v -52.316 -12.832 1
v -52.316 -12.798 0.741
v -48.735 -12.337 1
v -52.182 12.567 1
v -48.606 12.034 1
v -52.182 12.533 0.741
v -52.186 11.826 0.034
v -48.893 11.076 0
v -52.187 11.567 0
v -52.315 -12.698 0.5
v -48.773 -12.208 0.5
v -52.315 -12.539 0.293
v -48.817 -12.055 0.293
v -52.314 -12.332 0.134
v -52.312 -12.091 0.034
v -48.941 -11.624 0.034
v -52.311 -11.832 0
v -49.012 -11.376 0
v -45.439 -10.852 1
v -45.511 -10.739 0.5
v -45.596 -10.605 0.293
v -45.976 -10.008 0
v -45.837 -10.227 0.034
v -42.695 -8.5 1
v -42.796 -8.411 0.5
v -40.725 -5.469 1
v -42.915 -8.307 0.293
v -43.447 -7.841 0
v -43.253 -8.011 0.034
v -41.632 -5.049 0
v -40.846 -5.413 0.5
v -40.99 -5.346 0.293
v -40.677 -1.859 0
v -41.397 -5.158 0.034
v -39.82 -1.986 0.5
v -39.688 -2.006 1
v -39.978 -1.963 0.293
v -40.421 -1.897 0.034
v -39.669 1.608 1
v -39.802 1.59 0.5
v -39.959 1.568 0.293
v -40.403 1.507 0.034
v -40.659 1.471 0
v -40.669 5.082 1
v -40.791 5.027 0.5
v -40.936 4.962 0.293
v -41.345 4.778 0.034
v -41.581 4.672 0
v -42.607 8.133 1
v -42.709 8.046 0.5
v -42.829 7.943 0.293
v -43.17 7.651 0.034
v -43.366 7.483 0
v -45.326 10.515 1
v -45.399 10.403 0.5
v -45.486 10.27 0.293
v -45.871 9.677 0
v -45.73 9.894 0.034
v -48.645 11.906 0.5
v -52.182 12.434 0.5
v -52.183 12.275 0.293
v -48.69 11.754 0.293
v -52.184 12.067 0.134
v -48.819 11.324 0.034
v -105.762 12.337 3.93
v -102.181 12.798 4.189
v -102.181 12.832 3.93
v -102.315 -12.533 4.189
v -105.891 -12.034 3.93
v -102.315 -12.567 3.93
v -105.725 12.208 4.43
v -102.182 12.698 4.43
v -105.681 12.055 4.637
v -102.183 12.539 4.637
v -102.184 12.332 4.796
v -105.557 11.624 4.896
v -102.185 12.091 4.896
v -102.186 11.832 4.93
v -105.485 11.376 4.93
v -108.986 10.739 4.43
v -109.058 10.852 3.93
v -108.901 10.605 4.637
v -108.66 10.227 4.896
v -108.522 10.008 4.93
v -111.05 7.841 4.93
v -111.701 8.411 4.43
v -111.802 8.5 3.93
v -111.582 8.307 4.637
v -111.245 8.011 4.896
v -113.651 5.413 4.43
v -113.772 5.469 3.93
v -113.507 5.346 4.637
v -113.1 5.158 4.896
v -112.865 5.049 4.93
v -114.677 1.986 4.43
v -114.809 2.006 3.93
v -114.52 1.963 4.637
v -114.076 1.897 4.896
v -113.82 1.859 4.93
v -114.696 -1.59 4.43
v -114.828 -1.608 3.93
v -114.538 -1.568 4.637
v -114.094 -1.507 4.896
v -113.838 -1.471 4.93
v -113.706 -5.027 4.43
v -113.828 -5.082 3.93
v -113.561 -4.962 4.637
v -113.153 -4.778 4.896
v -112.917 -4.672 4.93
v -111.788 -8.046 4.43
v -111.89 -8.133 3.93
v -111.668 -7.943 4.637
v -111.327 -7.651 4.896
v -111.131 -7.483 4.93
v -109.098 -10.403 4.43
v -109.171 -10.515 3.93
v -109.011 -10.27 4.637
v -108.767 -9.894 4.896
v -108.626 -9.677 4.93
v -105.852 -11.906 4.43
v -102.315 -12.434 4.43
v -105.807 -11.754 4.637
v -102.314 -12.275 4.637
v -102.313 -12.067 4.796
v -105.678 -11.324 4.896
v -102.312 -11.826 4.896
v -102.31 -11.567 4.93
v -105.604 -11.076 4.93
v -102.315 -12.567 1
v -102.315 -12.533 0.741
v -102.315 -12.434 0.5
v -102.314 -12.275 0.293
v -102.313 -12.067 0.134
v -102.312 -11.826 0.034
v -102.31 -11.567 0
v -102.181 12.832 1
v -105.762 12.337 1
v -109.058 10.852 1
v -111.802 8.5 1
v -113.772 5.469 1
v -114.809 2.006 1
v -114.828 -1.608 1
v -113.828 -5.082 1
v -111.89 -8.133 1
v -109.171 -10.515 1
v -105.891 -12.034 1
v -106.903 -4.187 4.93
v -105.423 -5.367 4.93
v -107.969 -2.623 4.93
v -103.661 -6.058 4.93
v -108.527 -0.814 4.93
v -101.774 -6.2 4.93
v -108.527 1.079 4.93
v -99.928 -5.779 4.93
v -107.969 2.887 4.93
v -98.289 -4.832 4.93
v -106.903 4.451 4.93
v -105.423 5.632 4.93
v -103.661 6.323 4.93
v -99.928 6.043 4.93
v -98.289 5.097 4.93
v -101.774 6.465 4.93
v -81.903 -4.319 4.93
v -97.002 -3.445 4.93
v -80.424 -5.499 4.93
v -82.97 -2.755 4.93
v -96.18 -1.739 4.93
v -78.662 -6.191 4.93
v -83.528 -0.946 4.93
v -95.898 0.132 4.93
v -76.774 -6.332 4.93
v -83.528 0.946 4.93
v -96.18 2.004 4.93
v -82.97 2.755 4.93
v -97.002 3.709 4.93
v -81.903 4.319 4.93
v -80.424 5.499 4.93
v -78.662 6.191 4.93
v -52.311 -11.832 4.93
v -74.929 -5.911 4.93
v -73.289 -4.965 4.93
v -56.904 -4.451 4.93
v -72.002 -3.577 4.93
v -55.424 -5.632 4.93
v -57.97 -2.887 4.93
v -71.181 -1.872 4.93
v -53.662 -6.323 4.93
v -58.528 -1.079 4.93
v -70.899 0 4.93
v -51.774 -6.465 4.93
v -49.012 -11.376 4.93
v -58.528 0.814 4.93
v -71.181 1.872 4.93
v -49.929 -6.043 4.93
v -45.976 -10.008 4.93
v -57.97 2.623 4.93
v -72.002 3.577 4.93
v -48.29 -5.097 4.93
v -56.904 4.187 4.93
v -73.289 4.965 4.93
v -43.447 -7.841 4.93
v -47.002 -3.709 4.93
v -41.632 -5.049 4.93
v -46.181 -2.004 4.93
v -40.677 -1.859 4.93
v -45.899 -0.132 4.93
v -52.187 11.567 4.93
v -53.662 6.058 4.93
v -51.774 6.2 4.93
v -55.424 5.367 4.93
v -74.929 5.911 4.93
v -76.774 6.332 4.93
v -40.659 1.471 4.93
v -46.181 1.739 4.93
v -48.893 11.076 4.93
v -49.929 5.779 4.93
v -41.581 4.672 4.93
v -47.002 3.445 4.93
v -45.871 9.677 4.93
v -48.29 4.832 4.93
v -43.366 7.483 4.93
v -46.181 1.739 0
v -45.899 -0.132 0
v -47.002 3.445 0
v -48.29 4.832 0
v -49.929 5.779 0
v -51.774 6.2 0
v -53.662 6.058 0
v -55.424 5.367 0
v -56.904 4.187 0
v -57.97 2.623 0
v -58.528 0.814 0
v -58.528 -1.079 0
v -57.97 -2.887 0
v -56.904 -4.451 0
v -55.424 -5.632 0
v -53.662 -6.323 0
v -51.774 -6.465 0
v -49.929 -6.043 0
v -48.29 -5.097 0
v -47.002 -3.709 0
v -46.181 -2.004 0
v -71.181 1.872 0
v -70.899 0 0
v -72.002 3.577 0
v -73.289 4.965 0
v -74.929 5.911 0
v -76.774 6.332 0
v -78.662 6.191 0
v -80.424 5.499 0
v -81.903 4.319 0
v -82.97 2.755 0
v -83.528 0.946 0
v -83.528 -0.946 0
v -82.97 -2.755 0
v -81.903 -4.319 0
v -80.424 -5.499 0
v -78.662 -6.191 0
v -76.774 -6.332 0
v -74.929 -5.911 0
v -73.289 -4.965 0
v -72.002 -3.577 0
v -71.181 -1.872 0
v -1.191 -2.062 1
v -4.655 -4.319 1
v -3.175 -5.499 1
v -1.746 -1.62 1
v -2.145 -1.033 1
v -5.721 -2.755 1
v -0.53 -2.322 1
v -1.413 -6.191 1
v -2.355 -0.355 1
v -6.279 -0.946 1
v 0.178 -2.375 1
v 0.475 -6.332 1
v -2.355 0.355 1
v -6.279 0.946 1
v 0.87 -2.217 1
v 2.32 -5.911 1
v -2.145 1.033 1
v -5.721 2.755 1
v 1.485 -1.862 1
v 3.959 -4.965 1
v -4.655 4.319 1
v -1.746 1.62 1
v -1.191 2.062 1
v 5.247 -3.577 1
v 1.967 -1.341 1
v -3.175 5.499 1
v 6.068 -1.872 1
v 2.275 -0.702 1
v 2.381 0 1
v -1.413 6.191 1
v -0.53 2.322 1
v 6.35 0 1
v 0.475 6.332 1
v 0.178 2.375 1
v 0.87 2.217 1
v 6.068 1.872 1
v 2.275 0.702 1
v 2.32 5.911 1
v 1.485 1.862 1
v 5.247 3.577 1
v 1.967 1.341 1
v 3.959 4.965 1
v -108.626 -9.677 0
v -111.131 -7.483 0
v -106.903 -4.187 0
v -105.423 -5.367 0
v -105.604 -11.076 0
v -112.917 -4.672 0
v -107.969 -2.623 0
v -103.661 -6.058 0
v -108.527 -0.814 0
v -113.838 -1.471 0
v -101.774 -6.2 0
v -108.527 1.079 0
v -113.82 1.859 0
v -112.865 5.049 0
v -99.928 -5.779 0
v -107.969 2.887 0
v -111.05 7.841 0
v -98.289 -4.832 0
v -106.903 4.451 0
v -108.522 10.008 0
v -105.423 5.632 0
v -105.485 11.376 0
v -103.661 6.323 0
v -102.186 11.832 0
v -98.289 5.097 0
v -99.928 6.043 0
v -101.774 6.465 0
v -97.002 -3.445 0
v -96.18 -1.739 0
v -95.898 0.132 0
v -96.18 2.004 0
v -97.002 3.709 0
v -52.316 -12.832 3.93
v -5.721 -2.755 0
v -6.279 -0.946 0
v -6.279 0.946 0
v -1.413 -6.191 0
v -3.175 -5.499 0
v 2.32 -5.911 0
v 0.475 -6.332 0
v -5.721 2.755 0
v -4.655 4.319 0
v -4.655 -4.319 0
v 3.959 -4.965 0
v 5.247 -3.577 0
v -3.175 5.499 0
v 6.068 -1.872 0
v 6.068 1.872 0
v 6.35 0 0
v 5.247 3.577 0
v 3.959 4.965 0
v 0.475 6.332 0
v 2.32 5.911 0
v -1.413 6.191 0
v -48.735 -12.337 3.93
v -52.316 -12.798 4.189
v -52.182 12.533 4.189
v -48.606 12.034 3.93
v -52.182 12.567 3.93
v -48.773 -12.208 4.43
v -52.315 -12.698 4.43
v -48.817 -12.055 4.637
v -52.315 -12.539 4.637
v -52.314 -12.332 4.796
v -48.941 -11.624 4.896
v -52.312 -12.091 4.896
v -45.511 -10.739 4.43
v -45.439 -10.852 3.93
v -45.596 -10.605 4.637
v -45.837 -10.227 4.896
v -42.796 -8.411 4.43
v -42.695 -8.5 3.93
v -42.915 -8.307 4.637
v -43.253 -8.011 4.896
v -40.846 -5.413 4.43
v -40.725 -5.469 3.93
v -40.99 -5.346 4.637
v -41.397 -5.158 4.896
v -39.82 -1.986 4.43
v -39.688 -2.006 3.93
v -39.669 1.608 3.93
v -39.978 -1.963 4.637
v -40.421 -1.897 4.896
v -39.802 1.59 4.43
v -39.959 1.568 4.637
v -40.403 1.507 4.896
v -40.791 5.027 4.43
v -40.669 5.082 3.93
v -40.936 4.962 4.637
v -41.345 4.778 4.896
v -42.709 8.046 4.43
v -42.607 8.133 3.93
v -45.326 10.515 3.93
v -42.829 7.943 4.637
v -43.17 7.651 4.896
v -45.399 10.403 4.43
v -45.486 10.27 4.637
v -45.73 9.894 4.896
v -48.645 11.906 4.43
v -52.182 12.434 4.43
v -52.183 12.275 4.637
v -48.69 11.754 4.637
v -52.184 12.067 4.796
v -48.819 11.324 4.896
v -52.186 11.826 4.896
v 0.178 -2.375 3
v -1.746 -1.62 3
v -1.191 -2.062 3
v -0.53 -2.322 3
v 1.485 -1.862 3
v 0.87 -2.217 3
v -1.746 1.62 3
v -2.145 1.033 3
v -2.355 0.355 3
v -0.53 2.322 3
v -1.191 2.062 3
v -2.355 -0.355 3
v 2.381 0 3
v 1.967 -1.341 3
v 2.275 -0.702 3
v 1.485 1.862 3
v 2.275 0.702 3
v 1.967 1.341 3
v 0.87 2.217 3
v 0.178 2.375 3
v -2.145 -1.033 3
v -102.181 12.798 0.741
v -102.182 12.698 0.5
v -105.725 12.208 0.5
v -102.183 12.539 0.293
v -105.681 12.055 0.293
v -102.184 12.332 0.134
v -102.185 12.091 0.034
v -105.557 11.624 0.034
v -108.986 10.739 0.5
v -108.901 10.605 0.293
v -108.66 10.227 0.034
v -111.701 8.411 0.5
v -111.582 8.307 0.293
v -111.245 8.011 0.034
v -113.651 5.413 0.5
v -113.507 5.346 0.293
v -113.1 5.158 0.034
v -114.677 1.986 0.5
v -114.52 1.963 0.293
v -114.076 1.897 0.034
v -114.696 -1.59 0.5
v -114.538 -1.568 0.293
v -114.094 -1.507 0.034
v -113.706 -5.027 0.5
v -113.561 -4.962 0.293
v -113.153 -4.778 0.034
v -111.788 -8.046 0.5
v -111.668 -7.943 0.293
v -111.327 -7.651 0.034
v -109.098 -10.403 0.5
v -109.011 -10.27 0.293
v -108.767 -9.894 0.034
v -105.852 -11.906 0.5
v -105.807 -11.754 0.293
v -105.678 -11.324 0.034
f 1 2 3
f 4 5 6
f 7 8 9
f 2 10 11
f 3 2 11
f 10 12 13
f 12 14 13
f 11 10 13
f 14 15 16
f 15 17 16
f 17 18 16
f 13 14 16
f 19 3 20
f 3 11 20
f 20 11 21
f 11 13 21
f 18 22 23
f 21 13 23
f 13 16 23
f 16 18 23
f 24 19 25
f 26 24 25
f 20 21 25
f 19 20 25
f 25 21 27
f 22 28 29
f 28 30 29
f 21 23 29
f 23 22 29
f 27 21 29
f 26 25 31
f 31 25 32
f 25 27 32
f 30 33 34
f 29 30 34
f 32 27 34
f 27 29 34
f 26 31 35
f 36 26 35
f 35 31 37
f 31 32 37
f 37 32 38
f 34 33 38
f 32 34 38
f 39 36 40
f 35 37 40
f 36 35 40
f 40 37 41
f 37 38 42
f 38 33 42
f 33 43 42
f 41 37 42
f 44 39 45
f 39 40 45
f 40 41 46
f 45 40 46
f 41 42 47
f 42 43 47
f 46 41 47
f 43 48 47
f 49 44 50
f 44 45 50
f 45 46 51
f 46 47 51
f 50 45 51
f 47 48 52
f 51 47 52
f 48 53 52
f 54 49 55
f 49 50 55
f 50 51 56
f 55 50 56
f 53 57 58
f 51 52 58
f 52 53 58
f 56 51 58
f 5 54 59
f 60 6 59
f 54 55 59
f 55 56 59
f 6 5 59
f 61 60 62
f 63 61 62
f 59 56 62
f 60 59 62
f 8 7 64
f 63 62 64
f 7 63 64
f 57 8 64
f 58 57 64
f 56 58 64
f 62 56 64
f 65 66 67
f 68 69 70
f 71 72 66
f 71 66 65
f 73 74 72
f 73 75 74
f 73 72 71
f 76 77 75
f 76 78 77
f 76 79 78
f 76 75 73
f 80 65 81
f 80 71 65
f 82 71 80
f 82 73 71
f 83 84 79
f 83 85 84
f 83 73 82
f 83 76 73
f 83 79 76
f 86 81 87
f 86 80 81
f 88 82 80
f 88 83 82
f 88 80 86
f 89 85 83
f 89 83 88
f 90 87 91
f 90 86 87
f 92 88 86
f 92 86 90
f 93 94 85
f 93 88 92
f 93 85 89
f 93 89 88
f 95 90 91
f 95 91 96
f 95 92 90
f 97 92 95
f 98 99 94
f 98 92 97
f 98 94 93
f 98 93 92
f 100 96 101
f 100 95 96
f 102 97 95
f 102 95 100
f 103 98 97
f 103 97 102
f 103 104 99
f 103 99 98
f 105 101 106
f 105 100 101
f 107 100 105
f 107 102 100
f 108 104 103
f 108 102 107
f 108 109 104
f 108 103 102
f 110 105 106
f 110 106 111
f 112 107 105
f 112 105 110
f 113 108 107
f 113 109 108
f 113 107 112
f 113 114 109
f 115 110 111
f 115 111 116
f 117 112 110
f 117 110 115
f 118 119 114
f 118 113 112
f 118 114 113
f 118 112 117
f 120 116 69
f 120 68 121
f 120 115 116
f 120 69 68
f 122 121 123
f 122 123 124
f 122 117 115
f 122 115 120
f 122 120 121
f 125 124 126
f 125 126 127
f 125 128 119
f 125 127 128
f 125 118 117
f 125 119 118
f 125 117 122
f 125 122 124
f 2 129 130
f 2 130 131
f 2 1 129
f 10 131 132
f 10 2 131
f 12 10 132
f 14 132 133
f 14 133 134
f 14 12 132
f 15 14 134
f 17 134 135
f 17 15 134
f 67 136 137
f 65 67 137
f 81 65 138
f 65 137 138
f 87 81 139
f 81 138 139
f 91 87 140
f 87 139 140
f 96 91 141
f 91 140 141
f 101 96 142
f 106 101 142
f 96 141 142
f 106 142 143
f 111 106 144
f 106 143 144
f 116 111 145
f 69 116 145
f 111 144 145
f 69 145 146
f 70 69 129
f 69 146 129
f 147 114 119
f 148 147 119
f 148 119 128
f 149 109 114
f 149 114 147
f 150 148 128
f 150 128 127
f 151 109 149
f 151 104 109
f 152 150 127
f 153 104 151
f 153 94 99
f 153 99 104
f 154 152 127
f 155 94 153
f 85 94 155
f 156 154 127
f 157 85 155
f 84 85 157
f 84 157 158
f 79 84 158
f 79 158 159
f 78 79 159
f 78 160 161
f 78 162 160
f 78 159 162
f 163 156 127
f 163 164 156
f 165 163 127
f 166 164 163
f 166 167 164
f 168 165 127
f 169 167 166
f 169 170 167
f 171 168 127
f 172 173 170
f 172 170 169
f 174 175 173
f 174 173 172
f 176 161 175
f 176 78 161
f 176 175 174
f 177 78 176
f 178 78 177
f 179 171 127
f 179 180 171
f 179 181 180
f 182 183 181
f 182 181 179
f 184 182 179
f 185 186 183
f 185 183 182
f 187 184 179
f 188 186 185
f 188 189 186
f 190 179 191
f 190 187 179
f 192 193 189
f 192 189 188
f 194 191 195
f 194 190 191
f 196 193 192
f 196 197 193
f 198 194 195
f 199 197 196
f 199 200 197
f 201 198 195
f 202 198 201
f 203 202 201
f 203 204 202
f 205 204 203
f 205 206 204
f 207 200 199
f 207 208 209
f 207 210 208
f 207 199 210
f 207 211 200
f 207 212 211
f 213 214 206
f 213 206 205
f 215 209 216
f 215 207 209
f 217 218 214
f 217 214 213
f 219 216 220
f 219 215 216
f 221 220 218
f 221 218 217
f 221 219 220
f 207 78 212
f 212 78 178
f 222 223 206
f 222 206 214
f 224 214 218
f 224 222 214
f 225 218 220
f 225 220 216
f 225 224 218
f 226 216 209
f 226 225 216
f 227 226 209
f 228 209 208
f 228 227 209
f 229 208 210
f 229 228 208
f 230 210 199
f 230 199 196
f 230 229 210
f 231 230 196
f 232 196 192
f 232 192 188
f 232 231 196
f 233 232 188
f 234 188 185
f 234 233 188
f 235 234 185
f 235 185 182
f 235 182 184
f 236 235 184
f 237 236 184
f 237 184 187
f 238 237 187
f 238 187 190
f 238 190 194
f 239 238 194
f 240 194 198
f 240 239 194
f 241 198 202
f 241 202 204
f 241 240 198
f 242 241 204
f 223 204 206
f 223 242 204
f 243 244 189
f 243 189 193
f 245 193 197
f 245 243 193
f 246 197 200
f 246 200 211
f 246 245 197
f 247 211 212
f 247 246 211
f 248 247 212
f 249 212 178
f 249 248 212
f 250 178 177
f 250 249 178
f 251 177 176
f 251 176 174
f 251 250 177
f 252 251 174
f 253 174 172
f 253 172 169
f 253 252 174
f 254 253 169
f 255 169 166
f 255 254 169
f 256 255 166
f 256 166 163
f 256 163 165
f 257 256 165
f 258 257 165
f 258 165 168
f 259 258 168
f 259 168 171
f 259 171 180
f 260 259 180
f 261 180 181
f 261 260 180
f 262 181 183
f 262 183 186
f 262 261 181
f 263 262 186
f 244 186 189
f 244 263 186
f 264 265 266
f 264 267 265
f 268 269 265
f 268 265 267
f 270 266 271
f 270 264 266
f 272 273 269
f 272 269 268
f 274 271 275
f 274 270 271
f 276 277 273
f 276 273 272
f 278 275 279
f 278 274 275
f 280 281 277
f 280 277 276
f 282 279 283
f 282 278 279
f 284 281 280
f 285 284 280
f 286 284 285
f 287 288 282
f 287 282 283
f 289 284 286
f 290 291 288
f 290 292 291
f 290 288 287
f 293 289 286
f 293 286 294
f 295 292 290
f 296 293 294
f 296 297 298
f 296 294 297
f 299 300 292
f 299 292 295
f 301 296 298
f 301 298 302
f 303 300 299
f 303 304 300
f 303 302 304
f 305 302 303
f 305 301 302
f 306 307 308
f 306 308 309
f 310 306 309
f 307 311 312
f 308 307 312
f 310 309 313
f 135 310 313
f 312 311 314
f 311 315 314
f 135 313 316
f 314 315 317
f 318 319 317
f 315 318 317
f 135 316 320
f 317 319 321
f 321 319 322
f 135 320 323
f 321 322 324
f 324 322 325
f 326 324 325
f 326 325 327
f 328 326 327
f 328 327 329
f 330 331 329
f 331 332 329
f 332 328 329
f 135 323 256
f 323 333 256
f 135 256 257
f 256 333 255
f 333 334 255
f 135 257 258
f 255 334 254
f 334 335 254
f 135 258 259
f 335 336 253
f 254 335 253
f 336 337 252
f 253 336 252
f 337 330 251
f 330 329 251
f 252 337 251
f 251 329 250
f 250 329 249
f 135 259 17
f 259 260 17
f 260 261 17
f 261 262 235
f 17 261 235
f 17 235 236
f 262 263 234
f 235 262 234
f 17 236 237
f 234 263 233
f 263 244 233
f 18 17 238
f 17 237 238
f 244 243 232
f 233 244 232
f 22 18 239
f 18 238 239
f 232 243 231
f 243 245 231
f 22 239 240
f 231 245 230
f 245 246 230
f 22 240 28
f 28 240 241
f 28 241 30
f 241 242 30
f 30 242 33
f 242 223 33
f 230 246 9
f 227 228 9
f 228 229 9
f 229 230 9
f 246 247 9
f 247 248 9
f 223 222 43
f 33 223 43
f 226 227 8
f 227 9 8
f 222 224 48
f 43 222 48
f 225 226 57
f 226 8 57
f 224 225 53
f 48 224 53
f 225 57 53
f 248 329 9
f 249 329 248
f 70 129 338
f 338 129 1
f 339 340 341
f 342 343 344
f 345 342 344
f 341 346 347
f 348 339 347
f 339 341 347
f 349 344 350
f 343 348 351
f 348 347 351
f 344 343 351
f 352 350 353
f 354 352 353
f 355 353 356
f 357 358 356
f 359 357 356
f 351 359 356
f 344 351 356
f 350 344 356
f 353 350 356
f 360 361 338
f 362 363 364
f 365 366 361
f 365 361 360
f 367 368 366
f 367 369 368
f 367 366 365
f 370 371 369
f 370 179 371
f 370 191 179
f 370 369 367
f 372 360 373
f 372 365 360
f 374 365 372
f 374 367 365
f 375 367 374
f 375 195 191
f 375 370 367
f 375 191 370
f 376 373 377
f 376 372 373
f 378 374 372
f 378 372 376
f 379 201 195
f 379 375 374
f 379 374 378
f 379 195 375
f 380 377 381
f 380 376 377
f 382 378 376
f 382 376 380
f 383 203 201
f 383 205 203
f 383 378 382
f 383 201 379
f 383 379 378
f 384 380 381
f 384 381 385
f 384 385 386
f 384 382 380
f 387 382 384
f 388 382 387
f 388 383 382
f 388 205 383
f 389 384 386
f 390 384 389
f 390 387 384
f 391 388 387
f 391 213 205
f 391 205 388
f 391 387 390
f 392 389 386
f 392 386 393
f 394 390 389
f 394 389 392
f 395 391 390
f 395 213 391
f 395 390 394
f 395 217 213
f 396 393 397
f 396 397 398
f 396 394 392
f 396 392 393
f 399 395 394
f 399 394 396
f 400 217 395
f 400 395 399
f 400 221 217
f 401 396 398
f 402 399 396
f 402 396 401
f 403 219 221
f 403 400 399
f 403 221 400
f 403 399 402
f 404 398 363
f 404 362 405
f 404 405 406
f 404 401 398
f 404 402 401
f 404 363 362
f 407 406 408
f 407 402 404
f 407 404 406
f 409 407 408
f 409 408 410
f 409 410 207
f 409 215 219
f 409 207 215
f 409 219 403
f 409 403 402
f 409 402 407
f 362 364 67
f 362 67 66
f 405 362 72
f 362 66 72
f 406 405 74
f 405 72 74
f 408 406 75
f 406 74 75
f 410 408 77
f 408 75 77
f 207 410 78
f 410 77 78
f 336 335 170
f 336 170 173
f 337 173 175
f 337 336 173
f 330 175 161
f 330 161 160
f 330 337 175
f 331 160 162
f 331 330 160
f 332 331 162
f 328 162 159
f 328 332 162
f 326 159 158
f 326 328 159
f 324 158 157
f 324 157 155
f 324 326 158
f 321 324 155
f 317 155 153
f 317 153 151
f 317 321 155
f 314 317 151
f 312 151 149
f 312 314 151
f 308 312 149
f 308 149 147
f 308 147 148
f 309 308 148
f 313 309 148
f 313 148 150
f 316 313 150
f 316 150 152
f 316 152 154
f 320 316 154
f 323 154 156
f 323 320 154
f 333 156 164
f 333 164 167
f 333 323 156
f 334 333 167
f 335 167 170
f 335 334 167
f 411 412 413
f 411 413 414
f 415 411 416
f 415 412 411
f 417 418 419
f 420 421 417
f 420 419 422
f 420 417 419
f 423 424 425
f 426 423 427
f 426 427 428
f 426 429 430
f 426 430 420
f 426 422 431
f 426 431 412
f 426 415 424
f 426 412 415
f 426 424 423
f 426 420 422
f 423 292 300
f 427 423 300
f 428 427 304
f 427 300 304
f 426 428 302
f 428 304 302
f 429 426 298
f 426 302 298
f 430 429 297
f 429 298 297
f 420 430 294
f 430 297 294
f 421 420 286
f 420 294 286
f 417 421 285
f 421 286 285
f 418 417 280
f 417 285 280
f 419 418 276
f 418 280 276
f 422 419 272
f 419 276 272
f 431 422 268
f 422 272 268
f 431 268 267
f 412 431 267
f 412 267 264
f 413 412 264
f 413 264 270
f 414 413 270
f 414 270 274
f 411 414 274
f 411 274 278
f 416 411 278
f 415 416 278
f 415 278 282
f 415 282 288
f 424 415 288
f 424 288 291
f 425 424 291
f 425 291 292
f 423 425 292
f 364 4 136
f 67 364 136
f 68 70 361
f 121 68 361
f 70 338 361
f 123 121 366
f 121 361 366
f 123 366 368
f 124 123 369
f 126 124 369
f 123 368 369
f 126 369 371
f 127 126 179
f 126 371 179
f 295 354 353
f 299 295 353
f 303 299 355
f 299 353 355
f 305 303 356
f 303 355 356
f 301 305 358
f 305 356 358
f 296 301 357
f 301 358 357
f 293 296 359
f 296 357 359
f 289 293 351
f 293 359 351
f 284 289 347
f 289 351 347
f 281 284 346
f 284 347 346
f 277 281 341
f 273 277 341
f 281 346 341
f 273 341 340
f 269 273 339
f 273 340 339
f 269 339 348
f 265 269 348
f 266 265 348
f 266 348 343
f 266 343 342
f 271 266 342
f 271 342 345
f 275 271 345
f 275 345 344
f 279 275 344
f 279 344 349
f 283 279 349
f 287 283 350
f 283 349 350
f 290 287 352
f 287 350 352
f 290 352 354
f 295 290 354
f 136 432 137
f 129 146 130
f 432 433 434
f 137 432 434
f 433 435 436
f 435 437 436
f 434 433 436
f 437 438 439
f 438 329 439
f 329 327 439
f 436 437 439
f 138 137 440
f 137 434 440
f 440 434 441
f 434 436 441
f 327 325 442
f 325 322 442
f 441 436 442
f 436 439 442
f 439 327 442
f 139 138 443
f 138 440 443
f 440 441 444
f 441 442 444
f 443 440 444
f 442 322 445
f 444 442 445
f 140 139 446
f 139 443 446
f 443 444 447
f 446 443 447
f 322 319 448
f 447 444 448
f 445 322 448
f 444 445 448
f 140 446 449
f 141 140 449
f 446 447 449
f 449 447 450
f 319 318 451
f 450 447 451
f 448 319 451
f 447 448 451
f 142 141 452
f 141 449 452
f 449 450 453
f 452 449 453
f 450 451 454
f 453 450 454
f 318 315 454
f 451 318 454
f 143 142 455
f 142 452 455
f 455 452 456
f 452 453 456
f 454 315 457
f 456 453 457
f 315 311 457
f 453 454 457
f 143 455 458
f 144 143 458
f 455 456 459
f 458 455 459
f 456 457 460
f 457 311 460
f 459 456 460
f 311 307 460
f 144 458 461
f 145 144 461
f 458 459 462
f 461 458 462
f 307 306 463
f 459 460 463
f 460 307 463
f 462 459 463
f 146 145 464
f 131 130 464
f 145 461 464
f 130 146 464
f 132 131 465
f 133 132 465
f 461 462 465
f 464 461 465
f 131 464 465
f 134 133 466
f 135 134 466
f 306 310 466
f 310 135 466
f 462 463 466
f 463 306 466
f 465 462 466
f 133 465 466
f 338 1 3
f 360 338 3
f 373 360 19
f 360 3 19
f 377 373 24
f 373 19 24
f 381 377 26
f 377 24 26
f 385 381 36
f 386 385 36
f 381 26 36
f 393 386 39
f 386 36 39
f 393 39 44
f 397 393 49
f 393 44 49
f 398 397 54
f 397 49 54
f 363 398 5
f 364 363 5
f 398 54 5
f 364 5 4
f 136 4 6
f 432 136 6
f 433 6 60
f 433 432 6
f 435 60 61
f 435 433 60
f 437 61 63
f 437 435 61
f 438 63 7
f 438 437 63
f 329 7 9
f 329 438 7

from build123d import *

# Parameters (mm, degrees)
F0_R     = 6.35
F1_DEPTH = 4.93
F2_R     = 1
F0_R_2   = 2.38125
F3_DEPTH = 1
F4_DEPTH = 3


with BuildPart() as f1:
    # F0 (on Top) → F1 (new body)
    with BuildSketch(Plane.XY):
        with BuildLine():
            Line((-52.181716, 12.567485), (-102.181015, 12.832159))
            ThreePointArc((-102.181015, 12.832159), (-114.948064, 0.199565), (-102.31547, -12.567485))
            Line((-102.31547, -12.567485), (-52.31617, -12.832159))
            ThreePointArc((-52.31617, -12.832159), (-39.549121, -0.199565), (-52.181716, 12.567485))
        make_face()
        with Locations((-77.248593, 0)):
            Circle(F0_R, mode=Mode.SUBTRACT)
        with Locations((-52.248943, -0.132337)):
            Circle(F0_R, mode=Mode.SUBTRACT)
        with Locations((-102.248242, 0.132337)):
            Circle(F0_R, mode=Mode.SUBTRACT)
    extrude(amount=F1_DEPTH)

    # F2
    f2_edges = [f1.edges().sort_by_distance(p)[0] for p in [
        (-77.31582, -12.699822, 4.93),
        (-77.31582, -12.699822, 0),
        (-77.181365, 12.699822, 0),
    ]]
    fillet(f2_edges, radius=F2_R)


with BuildPart() as f3:
    # F0 (on Top) → F3 (new body)
    with BuildSketch(Plane.XY):
        Circle(F0_R)
        Circle(F0_R_2, mode=Mode.SUBTRACT)
    extrude(amount=F3_DEPTH)

    # F0 (on Top) → F4 (join)
    with BuildSketch(Plane.XY):
        Circle(F0_R_2)
    extrude(amount=F4_DEPTH)


solid = Compound([f1.part, f3.part])
